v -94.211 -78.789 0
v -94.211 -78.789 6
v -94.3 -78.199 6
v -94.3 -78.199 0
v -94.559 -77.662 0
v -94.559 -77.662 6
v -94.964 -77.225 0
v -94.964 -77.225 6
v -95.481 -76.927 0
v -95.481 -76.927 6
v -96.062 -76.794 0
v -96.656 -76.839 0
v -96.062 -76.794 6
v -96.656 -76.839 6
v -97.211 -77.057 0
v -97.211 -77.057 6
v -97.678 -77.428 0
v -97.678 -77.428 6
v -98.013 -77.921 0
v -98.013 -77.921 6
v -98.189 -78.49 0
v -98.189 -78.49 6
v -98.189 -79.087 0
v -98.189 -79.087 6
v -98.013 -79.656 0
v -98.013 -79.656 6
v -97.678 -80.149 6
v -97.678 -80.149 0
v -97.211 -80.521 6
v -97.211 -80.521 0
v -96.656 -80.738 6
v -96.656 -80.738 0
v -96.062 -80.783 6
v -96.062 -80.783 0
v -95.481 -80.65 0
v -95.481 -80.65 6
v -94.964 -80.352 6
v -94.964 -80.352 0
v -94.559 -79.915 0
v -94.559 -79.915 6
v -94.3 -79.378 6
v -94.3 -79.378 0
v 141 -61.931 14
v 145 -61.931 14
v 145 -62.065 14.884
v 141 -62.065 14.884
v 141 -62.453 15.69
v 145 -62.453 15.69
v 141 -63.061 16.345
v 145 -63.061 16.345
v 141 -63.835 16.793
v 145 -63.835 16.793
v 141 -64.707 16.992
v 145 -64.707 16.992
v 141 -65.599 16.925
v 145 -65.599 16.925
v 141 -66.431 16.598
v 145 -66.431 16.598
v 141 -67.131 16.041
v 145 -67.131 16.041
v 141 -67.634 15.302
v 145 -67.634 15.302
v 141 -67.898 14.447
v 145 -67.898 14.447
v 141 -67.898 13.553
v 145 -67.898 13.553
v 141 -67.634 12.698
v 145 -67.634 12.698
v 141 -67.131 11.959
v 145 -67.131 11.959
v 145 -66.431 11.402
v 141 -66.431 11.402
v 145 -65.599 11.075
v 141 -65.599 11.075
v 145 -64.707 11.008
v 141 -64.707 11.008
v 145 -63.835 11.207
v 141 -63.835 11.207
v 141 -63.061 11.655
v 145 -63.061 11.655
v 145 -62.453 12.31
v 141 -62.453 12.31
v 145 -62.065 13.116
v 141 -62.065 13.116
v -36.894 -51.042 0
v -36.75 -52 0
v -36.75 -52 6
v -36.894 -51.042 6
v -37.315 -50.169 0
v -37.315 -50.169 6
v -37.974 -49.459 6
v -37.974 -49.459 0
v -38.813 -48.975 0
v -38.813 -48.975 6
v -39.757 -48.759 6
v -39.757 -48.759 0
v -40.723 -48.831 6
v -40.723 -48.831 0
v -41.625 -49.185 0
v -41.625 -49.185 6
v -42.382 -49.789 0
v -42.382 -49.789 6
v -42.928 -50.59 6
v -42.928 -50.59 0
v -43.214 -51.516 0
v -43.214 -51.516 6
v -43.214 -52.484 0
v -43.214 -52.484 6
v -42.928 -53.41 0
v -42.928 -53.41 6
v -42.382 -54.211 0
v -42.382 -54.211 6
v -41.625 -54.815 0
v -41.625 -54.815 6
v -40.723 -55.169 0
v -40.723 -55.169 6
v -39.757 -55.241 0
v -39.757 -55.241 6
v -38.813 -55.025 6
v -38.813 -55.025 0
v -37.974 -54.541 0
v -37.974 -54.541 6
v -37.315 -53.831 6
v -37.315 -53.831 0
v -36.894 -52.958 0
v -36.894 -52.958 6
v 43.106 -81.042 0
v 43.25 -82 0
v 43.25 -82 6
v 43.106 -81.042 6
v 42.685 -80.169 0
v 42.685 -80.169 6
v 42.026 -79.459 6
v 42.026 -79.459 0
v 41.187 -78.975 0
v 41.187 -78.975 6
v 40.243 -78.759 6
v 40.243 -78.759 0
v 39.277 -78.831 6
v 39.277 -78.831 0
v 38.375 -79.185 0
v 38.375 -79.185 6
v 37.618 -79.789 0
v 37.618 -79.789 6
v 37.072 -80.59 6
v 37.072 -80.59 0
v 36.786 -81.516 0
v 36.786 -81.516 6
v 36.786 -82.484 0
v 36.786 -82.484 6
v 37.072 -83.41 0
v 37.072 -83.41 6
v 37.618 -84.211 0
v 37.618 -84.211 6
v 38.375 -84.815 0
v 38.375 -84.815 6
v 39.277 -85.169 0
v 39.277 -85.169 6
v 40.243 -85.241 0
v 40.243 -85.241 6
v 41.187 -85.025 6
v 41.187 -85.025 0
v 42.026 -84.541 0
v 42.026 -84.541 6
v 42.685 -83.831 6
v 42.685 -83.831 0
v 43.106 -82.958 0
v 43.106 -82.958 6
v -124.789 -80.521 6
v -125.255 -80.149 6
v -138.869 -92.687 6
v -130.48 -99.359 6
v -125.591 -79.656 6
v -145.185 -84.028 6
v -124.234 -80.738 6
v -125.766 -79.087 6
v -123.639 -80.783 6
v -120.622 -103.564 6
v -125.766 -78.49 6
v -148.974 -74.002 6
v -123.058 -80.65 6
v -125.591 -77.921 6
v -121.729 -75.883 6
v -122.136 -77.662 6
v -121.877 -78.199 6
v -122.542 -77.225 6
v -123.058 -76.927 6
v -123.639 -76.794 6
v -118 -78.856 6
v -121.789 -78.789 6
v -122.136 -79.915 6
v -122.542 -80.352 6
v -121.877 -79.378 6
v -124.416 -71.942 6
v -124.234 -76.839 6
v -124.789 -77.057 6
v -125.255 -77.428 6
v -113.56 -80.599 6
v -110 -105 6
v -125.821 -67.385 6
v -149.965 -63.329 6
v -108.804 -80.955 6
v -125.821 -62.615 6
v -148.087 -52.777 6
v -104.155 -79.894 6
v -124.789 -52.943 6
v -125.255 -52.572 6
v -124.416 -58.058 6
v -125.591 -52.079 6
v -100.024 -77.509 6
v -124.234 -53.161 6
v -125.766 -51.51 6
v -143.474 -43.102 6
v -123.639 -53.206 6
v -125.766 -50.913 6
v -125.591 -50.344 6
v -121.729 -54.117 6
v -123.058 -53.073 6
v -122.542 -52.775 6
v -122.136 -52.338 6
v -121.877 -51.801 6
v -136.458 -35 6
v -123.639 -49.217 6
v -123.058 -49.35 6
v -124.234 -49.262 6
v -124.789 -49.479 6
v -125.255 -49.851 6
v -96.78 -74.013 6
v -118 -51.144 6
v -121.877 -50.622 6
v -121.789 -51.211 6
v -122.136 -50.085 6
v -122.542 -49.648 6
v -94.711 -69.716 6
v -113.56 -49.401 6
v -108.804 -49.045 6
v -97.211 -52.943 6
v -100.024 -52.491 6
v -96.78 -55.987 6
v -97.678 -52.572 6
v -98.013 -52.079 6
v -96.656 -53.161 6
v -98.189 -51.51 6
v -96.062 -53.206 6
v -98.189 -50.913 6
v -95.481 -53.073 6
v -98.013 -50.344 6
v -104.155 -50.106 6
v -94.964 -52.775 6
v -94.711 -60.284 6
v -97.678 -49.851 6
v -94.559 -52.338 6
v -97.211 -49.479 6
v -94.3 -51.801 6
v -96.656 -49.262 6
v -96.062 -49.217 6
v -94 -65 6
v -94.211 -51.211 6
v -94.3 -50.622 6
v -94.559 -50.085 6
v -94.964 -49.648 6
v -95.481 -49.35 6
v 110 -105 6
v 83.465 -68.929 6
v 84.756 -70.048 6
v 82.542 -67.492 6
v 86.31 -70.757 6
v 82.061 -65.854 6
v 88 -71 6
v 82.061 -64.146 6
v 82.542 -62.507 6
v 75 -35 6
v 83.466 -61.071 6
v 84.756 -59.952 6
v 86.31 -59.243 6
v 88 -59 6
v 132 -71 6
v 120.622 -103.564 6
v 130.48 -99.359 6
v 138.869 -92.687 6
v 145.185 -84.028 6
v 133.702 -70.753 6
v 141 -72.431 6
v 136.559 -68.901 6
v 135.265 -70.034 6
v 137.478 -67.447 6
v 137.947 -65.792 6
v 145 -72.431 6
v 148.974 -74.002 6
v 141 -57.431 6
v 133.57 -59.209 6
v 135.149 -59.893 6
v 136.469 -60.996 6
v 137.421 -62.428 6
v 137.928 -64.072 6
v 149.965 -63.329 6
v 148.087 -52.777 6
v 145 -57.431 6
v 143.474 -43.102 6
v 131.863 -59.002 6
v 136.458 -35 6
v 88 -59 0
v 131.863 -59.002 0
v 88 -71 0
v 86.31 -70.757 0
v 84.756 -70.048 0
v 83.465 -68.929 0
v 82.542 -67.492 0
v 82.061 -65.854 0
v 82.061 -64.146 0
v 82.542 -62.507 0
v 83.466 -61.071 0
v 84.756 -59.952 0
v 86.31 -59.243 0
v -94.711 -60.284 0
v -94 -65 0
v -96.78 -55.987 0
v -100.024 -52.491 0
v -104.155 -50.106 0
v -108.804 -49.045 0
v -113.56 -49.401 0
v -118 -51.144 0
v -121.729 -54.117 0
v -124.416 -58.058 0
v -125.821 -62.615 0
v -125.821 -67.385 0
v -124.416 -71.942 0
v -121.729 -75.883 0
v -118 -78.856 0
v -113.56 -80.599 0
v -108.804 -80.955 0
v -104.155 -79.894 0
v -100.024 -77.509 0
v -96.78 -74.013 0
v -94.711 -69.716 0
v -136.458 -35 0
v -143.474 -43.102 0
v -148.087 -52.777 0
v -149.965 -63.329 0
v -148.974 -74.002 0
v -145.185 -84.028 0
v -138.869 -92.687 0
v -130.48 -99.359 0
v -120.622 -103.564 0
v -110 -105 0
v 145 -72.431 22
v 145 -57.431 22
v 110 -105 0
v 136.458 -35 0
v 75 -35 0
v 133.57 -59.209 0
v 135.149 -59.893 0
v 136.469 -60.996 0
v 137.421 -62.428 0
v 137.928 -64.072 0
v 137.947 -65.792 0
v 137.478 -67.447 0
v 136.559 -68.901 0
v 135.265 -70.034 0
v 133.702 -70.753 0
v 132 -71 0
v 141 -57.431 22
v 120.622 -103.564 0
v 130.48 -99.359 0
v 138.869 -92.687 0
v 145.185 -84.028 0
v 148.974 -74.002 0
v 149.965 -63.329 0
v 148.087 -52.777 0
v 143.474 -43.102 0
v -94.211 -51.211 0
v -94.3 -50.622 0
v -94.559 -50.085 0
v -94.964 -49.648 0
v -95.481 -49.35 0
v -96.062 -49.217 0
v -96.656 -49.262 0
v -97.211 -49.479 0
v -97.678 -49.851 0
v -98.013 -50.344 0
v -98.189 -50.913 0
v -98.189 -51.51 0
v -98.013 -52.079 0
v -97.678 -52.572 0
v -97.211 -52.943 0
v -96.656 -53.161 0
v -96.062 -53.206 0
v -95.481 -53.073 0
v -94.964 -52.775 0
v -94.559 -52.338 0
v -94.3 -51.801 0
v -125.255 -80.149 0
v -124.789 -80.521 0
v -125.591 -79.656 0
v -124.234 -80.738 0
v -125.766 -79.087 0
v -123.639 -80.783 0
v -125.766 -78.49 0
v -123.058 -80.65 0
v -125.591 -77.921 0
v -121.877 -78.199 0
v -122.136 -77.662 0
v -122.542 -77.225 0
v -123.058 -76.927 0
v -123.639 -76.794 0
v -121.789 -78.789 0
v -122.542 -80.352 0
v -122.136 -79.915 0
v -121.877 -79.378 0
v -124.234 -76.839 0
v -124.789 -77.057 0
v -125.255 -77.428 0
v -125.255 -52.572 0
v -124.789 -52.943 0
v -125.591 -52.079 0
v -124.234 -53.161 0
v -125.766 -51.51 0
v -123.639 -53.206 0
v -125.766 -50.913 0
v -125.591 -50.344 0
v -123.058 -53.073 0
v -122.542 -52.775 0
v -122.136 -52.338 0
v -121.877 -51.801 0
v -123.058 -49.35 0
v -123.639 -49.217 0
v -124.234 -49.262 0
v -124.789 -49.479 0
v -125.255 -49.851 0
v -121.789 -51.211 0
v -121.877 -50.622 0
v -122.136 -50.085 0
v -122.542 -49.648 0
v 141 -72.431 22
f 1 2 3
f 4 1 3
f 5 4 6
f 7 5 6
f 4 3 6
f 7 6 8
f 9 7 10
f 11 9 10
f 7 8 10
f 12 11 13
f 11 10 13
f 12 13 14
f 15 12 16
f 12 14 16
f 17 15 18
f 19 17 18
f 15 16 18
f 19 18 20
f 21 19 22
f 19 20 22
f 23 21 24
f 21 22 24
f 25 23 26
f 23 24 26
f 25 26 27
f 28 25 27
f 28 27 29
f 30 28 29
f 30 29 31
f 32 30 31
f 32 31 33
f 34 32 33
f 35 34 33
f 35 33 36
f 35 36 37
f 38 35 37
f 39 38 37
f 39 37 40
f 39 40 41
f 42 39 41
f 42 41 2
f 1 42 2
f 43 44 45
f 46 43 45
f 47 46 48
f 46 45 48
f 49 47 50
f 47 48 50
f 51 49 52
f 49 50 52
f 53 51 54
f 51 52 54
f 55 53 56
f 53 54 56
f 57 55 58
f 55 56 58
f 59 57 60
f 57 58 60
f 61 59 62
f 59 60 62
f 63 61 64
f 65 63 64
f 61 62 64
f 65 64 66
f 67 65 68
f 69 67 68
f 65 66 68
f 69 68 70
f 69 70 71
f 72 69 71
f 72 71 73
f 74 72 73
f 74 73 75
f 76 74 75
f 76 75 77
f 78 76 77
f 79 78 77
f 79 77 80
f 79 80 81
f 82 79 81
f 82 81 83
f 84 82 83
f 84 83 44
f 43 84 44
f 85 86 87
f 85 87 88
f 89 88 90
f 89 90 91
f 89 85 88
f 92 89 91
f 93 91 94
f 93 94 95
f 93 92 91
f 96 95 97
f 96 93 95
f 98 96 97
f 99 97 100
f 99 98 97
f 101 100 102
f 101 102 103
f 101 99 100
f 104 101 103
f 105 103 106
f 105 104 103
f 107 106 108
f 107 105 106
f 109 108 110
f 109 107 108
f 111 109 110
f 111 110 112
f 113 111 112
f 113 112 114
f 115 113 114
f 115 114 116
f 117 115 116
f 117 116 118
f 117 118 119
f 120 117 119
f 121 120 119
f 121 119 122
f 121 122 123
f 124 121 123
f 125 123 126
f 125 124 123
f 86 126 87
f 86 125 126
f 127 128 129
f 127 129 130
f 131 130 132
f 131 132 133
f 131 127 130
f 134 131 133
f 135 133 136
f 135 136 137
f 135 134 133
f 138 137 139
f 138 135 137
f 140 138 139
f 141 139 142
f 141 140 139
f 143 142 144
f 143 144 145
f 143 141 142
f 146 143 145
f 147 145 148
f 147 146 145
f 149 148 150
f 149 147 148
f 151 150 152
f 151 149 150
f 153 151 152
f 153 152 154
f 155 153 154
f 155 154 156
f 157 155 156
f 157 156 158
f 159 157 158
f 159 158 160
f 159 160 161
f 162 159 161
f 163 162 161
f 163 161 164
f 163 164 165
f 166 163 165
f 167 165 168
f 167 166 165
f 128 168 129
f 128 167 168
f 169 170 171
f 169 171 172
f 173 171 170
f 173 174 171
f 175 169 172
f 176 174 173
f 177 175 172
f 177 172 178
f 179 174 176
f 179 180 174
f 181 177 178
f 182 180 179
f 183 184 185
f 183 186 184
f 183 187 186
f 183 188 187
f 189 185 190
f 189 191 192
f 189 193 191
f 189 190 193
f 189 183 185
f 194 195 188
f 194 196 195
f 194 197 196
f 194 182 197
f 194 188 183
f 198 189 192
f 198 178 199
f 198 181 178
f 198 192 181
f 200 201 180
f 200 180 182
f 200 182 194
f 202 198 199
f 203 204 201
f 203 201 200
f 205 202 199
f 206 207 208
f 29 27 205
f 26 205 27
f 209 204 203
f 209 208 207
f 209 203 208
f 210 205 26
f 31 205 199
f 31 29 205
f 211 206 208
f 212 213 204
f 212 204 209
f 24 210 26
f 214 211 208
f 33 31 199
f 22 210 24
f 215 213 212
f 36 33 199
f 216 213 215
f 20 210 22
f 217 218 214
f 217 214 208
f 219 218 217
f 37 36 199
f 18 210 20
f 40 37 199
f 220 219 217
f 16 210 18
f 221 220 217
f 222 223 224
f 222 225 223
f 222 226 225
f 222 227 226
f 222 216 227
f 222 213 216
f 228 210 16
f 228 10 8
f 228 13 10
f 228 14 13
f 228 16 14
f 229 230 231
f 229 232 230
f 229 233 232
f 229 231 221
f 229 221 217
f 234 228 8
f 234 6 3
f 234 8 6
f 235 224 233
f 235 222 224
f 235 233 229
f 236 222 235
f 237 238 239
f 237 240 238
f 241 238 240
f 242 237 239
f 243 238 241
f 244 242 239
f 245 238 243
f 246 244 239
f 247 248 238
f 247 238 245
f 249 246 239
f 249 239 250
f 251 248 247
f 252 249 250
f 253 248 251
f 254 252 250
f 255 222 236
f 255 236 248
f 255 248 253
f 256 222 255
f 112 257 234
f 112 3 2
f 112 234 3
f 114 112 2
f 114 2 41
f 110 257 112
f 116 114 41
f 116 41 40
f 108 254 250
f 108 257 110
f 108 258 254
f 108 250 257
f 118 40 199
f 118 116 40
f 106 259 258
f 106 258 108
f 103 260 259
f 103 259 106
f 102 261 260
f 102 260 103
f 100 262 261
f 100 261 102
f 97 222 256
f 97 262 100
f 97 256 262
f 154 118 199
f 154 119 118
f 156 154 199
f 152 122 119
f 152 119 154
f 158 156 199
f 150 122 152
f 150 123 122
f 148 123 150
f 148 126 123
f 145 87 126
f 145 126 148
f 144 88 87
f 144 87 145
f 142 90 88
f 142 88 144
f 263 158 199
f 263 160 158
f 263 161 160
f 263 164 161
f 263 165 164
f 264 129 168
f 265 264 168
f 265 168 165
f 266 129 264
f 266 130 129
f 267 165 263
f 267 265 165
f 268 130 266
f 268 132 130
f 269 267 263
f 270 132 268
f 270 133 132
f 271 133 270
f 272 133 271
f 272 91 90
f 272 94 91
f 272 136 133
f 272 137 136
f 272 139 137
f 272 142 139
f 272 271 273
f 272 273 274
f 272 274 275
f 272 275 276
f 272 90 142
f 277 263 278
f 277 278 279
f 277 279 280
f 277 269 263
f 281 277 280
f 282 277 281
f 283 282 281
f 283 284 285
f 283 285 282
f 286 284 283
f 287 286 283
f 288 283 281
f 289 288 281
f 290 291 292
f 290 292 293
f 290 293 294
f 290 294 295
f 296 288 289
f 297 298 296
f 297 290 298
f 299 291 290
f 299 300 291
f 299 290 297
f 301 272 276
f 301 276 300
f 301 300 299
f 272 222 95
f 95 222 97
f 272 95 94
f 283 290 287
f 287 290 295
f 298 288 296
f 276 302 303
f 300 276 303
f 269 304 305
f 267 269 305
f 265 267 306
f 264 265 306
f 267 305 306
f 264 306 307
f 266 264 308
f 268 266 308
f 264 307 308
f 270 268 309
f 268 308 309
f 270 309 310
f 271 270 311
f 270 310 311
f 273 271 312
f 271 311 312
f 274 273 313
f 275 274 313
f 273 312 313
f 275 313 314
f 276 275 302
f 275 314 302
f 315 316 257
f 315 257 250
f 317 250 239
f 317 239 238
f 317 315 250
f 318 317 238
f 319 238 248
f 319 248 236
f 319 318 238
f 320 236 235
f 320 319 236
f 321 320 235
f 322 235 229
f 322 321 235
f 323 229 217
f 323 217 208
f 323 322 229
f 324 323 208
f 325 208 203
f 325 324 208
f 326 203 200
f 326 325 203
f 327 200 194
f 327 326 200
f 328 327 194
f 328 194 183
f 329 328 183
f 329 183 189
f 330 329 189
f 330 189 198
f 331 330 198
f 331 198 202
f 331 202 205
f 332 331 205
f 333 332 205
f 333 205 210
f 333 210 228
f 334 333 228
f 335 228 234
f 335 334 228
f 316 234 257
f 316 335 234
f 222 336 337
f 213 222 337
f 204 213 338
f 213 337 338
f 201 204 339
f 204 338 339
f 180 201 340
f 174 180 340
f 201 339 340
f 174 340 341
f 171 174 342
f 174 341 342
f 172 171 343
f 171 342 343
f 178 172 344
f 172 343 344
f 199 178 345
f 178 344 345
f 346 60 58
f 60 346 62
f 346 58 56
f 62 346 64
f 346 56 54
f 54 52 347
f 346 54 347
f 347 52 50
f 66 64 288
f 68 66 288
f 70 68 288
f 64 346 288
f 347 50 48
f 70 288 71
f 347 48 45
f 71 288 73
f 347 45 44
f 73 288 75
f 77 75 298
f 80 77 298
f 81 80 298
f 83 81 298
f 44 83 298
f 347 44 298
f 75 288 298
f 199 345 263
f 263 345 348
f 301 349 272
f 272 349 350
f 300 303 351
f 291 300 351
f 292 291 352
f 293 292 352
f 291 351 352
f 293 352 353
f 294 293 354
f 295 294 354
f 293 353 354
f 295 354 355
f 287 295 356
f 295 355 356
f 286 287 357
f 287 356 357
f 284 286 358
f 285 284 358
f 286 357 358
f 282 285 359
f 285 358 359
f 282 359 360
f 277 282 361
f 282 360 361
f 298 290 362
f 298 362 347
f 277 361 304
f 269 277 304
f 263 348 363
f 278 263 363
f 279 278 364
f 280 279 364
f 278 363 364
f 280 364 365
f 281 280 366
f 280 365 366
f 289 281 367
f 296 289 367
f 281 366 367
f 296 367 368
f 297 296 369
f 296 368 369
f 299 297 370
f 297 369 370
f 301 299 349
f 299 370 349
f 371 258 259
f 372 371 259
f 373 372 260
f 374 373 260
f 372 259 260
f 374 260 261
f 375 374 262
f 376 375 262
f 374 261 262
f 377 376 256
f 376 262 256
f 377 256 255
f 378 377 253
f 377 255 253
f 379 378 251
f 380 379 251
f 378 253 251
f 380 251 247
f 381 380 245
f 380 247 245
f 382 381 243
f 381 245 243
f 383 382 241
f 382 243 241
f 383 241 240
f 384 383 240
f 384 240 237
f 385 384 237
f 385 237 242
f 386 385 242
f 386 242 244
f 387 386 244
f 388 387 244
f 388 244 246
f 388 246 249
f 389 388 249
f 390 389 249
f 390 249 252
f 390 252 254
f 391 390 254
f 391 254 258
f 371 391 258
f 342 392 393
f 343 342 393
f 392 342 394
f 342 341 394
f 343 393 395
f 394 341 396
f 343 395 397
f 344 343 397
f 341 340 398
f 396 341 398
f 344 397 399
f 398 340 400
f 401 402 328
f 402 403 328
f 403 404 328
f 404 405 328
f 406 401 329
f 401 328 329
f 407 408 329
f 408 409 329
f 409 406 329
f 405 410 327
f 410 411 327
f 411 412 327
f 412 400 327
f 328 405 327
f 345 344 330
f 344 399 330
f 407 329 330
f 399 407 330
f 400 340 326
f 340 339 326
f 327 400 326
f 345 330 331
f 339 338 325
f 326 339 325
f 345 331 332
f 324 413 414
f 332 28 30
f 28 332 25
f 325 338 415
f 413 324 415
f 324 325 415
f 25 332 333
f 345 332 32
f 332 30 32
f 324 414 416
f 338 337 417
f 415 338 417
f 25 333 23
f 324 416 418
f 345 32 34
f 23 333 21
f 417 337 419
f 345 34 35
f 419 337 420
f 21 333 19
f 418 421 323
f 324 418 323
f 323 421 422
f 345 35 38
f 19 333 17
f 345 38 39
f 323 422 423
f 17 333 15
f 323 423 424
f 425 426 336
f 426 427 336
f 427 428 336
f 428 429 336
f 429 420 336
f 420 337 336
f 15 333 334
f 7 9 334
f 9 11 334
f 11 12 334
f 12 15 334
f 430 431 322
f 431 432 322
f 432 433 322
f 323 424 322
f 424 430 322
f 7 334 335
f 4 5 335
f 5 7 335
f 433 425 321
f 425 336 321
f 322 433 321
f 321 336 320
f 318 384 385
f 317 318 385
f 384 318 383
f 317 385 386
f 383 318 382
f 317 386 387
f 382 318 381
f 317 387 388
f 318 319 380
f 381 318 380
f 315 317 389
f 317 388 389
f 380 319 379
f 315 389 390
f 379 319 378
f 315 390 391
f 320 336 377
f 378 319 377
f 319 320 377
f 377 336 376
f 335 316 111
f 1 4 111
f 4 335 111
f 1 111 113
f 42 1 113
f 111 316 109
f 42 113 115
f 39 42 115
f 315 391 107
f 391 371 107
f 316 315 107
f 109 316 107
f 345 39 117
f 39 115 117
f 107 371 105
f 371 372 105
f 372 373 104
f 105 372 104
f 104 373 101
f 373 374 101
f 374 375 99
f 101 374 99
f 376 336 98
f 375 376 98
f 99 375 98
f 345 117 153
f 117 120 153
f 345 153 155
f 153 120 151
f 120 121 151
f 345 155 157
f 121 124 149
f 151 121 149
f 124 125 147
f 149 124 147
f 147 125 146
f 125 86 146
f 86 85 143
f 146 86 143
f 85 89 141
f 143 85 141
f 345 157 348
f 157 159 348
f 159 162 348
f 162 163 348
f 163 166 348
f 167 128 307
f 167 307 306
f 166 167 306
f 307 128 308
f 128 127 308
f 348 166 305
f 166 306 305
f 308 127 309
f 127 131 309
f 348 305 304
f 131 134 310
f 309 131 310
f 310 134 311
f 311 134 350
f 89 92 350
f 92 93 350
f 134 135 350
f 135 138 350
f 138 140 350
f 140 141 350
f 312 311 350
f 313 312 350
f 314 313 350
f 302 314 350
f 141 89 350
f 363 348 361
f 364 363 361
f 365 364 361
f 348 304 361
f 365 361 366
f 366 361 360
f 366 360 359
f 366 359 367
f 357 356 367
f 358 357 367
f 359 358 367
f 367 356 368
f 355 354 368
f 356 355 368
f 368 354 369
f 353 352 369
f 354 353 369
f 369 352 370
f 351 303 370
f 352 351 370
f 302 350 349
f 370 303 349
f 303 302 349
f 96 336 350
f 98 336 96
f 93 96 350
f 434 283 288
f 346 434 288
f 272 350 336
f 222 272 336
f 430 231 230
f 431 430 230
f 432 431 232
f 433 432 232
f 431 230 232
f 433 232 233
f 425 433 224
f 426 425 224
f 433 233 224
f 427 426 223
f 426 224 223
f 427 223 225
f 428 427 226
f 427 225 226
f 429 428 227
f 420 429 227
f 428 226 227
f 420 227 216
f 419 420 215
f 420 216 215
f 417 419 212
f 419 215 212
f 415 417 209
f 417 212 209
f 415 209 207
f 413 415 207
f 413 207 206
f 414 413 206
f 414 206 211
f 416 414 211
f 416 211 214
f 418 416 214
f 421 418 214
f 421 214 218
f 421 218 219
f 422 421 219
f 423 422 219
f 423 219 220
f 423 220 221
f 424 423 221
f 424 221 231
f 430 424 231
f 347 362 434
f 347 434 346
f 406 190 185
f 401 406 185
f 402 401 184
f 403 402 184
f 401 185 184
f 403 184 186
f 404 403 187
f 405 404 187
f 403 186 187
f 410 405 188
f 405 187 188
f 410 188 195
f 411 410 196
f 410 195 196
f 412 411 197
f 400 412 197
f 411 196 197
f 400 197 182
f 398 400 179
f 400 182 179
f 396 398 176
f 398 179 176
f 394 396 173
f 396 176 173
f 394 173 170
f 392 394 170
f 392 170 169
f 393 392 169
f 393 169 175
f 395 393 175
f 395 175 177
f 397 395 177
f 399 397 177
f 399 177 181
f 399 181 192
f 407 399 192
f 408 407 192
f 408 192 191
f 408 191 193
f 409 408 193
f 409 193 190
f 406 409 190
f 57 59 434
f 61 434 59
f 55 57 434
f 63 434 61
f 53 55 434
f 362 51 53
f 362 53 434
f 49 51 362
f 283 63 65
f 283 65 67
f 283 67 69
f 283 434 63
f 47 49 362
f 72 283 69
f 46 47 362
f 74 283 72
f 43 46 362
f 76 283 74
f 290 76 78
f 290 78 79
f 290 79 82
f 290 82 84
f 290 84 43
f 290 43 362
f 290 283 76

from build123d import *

# Parameters (mm, degrees)
F0_R     = 3.25
F0_R_2   = 16
F1_DEPTH = 6
F2_W     = 4
F2_H     = 15
F3_DEPTH = 16
F4_R     = 3
F5_DEPTH = 25
F6_R     = 2
F7_DEPTH = 25


# Not quite as in the source:
# - ends of sketch curves that miss each other by under 0.0002 mm in the source are joined


with BuildPart() as f1:
    # F0 (on Top) → F1 (new body)
    with BuildSketch(Plane.XY):
        with BuildLine():
            ThreePointArc((110, -105), (147.4165738824, -79.1421355849), (136.4575130484, -34.9999999451))
            Line((136.4575130484, -34.9999999451), (75, -35))
            Line((75, -35), (-75, -35))
            Line((-75, -35), (-136.457514, -35))
            ThreePointArc((-136.457514, -35), (-147.4165737498, -79.1421359357), (-110, -105))
            Line((-110, -105), (-75, -105))
            Line((-75, -105), (75, -105))
            Line((75, -105), (110, -105))
        make_face()
        with Locations((40, -82)):
            Circle(F0_R, mode=Mode.SUBTRACT)
        with Locations((-110, -65)):
            Circle(F0_R_2, mode=Mode.SUBTRACT)
        with Locations((-40, -52)):
            Circle(F0_R, mode=Mode.SUBTRACT)
        with BuildLine():
            Line((88.000112, -59), (131.86291, -59.001567))
            ThreePointArc((131.86291, -59.001567), (137.9996084013, -64.9314505185), (132, -71))
            Line((132, -71), (88, -71))
            ThreePointArc((88, -71), (82.0000000003, -64.999944), (88.000112, -59))
        make_face(mode=Mode.SUBTRACT)
    extrude(amount=F1_DEPTH)

    # F2 (on face) → F3 (join)
    with BuildSketch(Plane.XY.offset(6)):
        with Locations((143, -64.9314505185)):
            Rectangle(F2_W, F2_H)
    extrude(amount=F3_DEPTH)

    # F4 (on face) → F5 (cut)
    with BuildSketch(Plane.YZ.offset(145)):
        with Locations((-64.9314505185, 14)):
            Circle(F4_R)
    extrude(amount=-F5_DEPTH, mode=Mode.SUBTRACT)

    # F6 (on face) → F7 (cut)
    with BuildSketch(Plane.XY.offset(6)):
        with Locations((-123.7885822331, -51.2114177669)):
            Circle(F6_R)
        with Locations((-96.2114177669, -51.2114177669)):
            Circle(F6_R)
        with Locations((-96.2114177669, -78.7885822331)):
            Circle(F6_R)
        with Locations((-123.7885822331, -78.7885822331)):
            Circle(F6_R)
    extrude(amount=-F7_DEPTH, mode=Mode.SUBTRACT)


solid = f1.part
